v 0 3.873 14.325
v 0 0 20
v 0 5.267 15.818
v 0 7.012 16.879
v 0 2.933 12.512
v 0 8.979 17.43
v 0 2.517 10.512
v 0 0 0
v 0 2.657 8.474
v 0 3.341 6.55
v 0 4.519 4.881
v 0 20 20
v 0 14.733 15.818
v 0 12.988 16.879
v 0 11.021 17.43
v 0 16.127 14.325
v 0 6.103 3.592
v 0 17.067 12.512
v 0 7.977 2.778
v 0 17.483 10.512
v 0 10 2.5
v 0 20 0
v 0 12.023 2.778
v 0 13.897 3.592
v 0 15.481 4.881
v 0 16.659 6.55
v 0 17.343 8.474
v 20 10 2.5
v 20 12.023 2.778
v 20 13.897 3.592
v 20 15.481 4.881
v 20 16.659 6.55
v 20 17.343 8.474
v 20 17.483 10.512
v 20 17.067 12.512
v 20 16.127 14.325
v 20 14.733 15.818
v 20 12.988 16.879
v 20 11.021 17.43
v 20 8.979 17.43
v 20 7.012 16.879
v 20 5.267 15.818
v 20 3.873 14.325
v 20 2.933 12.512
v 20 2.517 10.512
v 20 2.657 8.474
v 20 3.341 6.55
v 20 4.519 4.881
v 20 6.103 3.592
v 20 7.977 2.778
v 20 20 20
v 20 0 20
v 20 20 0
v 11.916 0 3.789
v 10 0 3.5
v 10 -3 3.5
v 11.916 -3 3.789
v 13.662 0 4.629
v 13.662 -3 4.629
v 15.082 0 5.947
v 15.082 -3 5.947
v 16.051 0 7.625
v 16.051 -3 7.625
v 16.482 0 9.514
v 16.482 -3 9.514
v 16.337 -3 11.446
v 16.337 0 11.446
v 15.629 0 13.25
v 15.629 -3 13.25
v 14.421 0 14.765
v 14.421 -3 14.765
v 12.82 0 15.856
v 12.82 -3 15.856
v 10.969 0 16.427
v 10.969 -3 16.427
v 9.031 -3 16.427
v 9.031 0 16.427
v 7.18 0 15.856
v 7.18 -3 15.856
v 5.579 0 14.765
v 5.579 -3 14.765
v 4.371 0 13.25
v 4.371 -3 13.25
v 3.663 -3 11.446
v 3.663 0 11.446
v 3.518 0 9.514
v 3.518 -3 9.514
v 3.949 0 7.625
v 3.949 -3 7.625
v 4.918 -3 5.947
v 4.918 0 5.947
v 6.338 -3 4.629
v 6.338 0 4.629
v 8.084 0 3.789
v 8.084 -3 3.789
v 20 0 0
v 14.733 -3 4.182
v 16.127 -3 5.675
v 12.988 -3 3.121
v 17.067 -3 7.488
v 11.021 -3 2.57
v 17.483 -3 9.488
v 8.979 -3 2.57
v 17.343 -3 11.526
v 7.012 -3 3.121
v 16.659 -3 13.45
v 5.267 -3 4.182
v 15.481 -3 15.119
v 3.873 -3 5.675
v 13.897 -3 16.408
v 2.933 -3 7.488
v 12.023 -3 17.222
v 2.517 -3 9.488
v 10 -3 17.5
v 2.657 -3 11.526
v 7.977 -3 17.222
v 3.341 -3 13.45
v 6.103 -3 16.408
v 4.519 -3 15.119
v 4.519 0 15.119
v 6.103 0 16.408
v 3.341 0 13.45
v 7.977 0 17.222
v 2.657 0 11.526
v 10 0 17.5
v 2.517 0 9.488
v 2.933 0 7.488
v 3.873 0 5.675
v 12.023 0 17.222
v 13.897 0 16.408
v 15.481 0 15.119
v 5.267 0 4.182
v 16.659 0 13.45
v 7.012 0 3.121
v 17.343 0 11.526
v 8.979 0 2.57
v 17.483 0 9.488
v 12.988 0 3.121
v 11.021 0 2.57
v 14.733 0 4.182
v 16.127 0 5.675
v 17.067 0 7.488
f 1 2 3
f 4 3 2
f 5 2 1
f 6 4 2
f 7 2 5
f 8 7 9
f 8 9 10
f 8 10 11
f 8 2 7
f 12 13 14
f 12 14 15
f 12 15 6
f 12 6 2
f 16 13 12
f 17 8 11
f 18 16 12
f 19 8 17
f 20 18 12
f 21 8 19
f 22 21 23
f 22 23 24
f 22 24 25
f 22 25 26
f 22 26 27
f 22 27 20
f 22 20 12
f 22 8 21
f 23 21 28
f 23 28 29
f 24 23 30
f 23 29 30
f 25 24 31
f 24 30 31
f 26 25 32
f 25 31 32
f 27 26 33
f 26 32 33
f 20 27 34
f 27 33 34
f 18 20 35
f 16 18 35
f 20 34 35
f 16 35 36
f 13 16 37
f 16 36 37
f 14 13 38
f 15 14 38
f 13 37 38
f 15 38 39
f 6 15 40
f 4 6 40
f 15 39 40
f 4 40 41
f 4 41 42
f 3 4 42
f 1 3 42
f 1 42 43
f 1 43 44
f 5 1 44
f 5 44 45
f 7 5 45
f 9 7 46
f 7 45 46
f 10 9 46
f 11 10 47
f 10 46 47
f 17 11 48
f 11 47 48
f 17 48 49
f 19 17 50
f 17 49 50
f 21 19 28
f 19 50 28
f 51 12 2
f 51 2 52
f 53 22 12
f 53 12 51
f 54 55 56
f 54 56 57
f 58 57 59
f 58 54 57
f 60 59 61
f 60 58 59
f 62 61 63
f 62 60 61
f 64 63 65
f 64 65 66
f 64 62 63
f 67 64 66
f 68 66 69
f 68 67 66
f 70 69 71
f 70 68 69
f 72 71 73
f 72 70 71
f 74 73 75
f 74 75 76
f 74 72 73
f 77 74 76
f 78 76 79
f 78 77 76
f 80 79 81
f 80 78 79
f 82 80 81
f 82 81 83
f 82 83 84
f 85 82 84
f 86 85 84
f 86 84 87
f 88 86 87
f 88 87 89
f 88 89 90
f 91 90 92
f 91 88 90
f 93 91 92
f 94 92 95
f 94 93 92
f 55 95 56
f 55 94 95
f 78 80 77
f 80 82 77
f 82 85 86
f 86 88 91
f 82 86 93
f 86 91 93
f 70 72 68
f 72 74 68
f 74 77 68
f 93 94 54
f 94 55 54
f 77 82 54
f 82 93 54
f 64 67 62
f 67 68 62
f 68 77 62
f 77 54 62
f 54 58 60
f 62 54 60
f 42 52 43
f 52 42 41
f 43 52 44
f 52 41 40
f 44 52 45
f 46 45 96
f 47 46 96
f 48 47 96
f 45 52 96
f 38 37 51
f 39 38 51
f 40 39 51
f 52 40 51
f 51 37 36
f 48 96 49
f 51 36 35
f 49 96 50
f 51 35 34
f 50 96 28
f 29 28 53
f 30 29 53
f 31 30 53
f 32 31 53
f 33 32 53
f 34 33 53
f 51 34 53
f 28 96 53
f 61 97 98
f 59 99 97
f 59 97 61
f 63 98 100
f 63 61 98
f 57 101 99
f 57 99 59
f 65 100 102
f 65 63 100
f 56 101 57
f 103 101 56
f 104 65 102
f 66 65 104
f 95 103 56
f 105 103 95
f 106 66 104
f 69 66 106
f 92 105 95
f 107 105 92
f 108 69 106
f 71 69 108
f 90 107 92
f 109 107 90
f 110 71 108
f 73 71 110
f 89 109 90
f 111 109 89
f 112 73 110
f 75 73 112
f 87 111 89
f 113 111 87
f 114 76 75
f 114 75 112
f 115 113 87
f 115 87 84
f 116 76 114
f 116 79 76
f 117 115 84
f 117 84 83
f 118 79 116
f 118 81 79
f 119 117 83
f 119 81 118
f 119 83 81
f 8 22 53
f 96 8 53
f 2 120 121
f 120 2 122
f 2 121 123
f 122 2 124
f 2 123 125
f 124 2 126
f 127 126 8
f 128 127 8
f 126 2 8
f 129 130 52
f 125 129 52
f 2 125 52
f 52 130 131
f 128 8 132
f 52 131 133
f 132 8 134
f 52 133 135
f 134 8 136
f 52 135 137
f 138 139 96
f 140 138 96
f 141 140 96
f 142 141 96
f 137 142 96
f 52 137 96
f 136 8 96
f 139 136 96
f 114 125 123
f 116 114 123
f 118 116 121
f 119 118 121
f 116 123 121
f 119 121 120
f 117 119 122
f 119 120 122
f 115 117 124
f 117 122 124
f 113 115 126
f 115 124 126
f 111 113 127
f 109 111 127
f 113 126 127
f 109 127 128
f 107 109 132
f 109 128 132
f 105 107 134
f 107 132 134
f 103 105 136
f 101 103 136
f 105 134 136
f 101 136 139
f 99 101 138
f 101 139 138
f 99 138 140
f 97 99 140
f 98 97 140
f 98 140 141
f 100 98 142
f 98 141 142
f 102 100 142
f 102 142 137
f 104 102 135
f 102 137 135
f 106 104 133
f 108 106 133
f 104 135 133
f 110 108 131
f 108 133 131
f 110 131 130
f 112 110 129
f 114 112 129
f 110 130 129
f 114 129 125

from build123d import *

# Parameters (mm, degrees)
SKETCH1_W           = 20
SKETCH1_H           = 20
BOSS_EXTRUDE1_DEPTH = 20
SKETCH2_R           = 7.5
CUT_EXTRUDE1_DEPTH  = 20
SKETCH3_R           = 7.5
SKETCH3_R_2         = 6.5
BOSS_EXTRUDE2_DEPTH = 3


with BuildPart() as part:
    # Sketch1 → Boss-Extrude1 (new body)
    with BuildSketch(Plane.XY):
        with Locations((10, 10)):
            Rectangle(SKETCH1_W, SKETCH1_H)
    extrude(amount=BOSS_EXTRUDE1_DEPTH)

    # Sketch2 → Cut-Extrude1 (cut)
    with BuildSketch(Plane(origin=(20, 0, 0), x_dir=(0, 0, -1), z_dir=(1, 0, 0))):
        with Locations((-10, 10)):
            Circle(SKETCH2_R)
    extrude(amount=-CUT_EXTRUDE1_DEPTH, mode=Mode.SUBTRACT)

    # Sketch3 → Boss-Extrude2 (add)
    with BuildSketch(Plane(origin=(0, 0, 0), x_dir=(-1, 0, 0), z_dir=(0, -1, 0))):
        with Locations(Location((-10, -10, 0), (0, 0, 270))):
            Circle(SKETCH3_R)
        with Locations(Location((-10, -10, 0), (0, 0, 90))):
            Circle(SKETCH3_R_2, mode=Mode.SUBTRACT)
    extrude(amount=BOSS_EXTRUDE2_DEPTH)


solid = part.part
